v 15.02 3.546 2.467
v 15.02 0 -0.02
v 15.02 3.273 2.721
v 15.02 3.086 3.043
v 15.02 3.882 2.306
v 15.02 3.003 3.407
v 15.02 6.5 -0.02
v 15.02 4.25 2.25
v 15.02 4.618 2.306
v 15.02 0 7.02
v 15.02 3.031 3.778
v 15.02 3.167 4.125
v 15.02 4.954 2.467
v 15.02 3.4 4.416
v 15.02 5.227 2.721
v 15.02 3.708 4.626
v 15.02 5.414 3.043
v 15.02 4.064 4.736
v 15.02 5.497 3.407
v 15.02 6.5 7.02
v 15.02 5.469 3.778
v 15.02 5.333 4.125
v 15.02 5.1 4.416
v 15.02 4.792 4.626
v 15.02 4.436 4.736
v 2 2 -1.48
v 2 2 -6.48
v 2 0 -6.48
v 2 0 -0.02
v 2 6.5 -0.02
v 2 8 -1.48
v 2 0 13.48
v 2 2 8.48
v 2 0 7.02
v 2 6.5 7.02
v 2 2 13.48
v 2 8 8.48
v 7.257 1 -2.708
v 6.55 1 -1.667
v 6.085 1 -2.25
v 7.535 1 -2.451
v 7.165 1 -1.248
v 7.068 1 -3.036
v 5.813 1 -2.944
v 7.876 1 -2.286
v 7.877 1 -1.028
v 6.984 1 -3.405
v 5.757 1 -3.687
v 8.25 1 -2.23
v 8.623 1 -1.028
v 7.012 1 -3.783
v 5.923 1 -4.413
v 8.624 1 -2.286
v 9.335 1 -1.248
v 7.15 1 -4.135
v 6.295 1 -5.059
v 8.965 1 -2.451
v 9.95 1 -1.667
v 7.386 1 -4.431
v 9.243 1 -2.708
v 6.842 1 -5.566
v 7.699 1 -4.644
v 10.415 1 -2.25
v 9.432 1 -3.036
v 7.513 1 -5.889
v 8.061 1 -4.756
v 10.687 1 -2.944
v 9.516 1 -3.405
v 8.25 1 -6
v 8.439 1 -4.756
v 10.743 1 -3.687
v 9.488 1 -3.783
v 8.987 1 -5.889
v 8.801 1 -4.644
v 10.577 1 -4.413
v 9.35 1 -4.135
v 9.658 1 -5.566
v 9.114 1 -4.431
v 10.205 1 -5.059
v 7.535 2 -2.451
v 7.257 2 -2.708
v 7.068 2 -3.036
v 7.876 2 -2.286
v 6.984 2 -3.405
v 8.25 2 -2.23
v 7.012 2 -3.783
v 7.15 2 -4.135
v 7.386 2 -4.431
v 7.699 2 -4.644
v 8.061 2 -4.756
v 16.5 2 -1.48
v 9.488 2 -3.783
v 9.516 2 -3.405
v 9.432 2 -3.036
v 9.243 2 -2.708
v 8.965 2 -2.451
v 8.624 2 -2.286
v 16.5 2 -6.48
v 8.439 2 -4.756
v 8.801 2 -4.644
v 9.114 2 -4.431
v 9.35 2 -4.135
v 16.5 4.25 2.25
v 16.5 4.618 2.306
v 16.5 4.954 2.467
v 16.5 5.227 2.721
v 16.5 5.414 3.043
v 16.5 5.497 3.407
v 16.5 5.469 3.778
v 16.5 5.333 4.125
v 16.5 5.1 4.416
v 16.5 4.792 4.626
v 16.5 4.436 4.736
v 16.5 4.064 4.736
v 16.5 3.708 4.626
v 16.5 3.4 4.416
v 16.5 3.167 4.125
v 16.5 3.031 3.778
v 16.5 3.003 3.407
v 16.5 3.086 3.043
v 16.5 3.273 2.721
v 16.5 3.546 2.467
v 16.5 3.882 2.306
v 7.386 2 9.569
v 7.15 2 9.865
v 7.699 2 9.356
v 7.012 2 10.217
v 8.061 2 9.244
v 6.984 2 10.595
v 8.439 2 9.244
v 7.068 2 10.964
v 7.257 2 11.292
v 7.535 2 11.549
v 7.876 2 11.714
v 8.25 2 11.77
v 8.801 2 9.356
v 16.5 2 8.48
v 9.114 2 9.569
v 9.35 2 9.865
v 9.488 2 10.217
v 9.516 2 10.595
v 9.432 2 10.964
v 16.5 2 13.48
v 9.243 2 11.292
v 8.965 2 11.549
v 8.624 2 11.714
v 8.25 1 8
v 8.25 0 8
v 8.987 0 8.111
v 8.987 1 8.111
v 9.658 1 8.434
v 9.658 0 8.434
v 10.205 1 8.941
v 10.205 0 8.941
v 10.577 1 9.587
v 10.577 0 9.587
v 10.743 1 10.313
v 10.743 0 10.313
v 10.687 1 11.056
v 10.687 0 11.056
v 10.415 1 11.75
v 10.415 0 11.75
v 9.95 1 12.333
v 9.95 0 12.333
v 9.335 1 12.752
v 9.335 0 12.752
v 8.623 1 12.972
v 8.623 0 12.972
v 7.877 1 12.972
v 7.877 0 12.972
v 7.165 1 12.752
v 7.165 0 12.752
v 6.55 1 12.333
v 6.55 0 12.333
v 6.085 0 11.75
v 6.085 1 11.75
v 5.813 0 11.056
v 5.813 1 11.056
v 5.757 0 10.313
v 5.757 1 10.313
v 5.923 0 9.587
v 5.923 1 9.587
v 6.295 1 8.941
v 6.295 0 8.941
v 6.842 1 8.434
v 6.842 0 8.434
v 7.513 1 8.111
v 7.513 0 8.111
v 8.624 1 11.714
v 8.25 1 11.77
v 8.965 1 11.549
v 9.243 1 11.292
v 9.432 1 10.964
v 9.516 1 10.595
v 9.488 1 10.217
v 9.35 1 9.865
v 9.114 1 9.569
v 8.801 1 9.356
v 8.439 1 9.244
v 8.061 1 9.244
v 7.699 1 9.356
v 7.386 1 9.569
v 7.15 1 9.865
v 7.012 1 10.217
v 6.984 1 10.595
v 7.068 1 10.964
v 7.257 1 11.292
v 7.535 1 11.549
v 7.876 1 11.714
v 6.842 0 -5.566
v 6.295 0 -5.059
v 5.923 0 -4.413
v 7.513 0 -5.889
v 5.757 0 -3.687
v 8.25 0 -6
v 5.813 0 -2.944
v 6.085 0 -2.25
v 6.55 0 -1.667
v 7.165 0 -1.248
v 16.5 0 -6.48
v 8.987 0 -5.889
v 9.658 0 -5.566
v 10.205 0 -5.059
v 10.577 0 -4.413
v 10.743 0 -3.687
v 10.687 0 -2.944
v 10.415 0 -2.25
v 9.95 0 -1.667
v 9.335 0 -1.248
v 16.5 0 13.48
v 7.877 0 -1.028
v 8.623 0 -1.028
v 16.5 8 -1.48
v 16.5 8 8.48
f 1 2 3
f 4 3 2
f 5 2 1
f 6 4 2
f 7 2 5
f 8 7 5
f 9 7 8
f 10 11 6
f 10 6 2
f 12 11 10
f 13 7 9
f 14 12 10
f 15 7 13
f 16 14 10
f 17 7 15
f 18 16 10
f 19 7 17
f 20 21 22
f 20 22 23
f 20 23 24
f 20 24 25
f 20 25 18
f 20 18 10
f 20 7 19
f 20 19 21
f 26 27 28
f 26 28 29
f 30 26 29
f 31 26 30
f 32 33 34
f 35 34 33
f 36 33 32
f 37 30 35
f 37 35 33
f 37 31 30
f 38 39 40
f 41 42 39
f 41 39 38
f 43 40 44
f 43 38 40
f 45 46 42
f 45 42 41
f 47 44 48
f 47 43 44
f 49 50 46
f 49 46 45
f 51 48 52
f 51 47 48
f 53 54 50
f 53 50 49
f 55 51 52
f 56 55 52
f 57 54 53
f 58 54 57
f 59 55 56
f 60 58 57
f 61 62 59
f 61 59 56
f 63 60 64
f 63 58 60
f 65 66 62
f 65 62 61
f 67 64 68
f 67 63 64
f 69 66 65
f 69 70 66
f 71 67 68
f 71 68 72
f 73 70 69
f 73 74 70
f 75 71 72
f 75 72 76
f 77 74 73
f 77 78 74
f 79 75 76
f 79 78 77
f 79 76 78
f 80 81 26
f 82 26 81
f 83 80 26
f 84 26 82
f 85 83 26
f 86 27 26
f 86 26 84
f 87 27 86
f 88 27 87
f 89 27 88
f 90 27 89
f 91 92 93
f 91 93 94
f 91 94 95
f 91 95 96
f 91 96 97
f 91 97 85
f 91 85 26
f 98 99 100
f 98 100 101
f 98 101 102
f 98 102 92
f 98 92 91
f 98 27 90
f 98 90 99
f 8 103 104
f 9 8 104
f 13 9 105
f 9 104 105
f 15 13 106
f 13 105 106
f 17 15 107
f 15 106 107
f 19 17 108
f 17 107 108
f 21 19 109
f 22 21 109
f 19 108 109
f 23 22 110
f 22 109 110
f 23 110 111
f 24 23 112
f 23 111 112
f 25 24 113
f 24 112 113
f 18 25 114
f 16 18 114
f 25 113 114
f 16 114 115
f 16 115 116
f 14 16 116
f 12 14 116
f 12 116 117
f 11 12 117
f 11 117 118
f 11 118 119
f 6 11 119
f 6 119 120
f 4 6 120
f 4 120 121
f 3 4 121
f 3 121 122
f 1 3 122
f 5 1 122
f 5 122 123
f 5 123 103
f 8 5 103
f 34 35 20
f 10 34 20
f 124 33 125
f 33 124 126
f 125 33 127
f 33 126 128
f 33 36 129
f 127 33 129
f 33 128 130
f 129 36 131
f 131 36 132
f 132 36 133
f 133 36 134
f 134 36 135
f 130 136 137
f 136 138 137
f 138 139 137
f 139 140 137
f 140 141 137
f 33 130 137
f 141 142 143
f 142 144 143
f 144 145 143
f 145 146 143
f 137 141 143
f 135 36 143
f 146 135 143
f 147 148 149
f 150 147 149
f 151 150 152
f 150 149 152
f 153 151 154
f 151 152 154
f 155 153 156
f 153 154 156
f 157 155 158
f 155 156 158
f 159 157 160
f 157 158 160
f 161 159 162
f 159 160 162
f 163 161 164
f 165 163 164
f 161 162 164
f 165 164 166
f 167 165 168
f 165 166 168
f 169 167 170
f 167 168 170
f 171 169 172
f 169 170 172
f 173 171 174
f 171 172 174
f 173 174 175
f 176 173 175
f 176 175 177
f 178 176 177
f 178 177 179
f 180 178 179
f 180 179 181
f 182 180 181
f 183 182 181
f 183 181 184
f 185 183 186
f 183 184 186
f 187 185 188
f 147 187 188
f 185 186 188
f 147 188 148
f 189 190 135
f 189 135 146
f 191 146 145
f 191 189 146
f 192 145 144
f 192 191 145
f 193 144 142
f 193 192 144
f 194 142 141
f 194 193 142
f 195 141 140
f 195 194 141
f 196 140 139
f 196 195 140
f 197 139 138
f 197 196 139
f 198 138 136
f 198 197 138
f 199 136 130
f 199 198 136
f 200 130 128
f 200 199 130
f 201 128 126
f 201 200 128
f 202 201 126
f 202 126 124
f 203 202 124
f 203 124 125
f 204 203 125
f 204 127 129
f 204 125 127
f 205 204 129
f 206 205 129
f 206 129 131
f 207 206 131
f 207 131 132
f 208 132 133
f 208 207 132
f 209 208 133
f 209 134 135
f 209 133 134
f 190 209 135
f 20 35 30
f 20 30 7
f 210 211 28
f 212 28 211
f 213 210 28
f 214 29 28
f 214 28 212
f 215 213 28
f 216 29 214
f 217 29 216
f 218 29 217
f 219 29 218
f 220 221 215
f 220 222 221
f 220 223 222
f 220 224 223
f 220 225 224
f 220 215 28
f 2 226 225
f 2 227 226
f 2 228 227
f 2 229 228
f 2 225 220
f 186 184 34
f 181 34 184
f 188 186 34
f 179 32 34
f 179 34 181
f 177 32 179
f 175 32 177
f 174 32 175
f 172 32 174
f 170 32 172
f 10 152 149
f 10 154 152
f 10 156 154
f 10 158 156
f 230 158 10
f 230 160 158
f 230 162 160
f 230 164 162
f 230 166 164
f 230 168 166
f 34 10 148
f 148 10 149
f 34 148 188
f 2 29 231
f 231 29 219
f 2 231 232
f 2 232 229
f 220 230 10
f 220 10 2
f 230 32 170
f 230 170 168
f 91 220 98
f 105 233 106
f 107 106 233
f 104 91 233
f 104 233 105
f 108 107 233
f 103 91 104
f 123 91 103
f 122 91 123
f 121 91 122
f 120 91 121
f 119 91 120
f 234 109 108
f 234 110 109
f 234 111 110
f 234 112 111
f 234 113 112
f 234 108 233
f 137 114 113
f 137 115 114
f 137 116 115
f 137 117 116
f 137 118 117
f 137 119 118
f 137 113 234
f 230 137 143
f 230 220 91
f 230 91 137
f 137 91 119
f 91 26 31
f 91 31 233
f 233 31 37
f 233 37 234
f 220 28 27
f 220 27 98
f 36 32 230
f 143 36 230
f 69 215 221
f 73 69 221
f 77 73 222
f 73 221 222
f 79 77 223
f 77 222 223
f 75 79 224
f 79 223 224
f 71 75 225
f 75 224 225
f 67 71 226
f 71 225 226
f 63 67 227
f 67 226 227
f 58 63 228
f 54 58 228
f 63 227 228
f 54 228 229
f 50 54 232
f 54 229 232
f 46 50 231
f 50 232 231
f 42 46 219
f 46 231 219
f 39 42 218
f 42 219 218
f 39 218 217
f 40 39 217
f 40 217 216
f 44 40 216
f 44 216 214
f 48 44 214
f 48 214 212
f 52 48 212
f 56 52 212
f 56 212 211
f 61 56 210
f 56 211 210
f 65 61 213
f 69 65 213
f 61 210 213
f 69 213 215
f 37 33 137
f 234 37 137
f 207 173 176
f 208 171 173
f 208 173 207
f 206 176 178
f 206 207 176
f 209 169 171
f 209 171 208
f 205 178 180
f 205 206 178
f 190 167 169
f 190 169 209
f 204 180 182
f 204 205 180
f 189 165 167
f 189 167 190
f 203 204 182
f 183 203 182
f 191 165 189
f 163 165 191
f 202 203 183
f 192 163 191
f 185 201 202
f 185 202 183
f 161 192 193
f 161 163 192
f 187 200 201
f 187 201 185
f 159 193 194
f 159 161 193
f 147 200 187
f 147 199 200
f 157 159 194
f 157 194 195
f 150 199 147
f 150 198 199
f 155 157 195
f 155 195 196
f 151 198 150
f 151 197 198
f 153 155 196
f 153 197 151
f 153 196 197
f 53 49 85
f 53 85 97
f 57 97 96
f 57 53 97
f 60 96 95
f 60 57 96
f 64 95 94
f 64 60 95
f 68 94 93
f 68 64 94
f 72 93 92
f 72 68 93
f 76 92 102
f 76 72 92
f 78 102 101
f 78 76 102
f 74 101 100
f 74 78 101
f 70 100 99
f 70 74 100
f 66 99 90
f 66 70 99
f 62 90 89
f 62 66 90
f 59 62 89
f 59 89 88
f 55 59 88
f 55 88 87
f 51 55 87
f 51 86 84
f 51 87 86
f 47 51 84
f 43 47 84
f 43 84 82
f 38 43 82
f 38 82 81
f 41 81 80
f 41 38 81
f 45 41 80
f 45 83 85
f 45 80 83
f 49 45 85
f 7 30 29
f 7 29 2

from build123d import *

# Parameters (mm, degrees)
EXTRUDE_1_DEPTH          = 6.5
EXTRUDE_2_DEPTH          = 1.5
SKETCH_3_R               = 1.25
CUT_EXTRUDE_1_DEPTH      = 21.211382931
SKETCH_4_W               = 16.5
SKETCH_4_H               = 5
EXTRUDE_3_DEPTH          = 2
SKETCH_5_R               = 1.25
CUT_EXTRUDE_2_DEPTH      = 10
SKETCH_6_R               = 2.5
CUT_EXTRUDE_3_DEPTH      = 1
CUT_EXTRUDE_4_DEPTH      = 23.14723459
CUT_EXTRUDE_4_DEPTH_BACK = 23.14723459
SKETCH_7_R               = 1.27
CUT_EXTRUDE_5_DEPTH      = 23.14723459
CUT_EXTRUDE_5_DEPTH_BACK = 23.14723459
SKETCH_8_W               = 16.5
SKETCH_8_H               = 0.229721737
SKETCH_8_H_2             = 0.3558102
CUT_EXTRUDE_6_DEPTH      = 23.758743375
CUT_EXTRUDE_6_DEPTH_BACK = 6
SKETCH_9_W               = 16.5
SKETCH_9_H               = 0.02
SKETCH_10_W              = 15.04
SKETCH_10_H              = 7.04
CUT_EXTRUDE_7_DEPTH      = 6.5
SKETCH_11_W              = 27.526079408
SKETCH_11_H              = 12.932606898
CUT_EXTRUDE_8_DEPTH      = 2


with BuildPart() as part:
    # 草图1 → 凸台-拉伸1 (new body)
    with BuildSketch(Plane(origin=(0, 0, 0), x_dir=(1, 0, 0), z_dir=(0, 1, 0))):
        Polygon((0, 1.5), (16.5, 1.5), (16.5, -8.5), (0, -8.5), (0, -7), (15, -7), (15, 0), (0, 0), align=None)
    extrude(amount=EXTRUDE_1_DEPTH)

    # 草图2 → 凸台-拉伸2 (add)
    with BuildSketch(Plane(origin=(0, 6.5, 0), x_dir=(1, 0, 0), z_dir=(0, 1, 0))):
        Polygon((0, 0), (0, -7), (0, -8.5), (16.5, -8.5), (16.5, 1.5), (0, 1.5), align=None)
    extrude(amount=EXTRUDE_2_DEPTH)

    # 草图3 → 切除-拉伸1 (cut, through all)
    with BuildSketch(Plane(origin=(16.5, 0, 0), x_dir=(0, 0, -1), z_dir=(1, 0, 0))):
        with Locations((-3.5, 4.25)):
            Circle(SKETCH_3_R)
    extrude(amount=-CUT_EXTRUDE_1_DEPTH, mode=Mode.SUBTRACT)

    # 草图4 → 凸台-拉伸3 (add)
    with BuildSketch(Plane.XZ):
        with Locations((8.25, 11)):
            Rectangle(SKETCH_4_W, SKETCH_4_H)
        with Locations((8.25, -4)):
            Rectangle(SKETCH_4_W, SKETCH_4_H)
    extrude(amount=-EXTRUDE_3_DEPTH)

    # 草图5 → 切除-拉伸2 (cut)
    with BuildSketch(Plane.XZ):
        with Locations(Location((8.25, 10.5, 0), (0, 0, 270))):
            Circle(SKETCH_5_R)
        with Locations(Location((8.25, -3.5, 0), (0, 0, 270))):
            Circle(SKETCH_5_R)
    extrude(amount=-CUT_EXTRUDE_2_DEPTH, mode=Mode.SUBTRACT)

    # 草图6 → 切除-拉伸3 (cut)
    with BuildSketch(Plane.XZ):
        with Locations(Location((8.25, 10.5, 0), (0, 0, 270))):
            Circle(SKETCH_6_R)
        with Locations(Location((8.25, -3.5, 0), (0, 0, 270))):
            Circle(SKETCH_6_R)
    extrude(amount=-CUT_EXTRUDE_3_DEPTH, mode=Mode.SUBTRACT)

    # 草图7 → 切除-拉伸4 (cut, two sides: drawn at the far end of the back side and taken through both)
    with BuildSketch(Plane(origin=(0, 2, 0), x_dir=(1, 0, 0), z_dir=(0, 1, 0)).offset(-CUT_EXTRUDE_4_DEPTH_BACK)):
        with Locations(Location((8.25, 3.5, 0), (0, 0, 270))):
            Circle(SKETCH_7_R)
        with Locations(Location((8.25, -10.5, 0), (0, 0, 270))):
            Circle(SKETCH_7_R)
    extrude(amount=CUT_EXTRUDE_4_DEPTH + CUT_EXTRUDE_4_DEPTH_BACK, mode=Mode.SUBTRACT)

    # 草图8 → 切除-拉伸5 (cut, two sides: drawn at the far end of the back side and taken through both)
    with BuildSketch(Plane(origin=(0, 2, 0), x_dir=(1, 0, 0), z_dir=(0, 1, 0)).offset(-CUT_EXTRUDE_5_DEPTH_BACK)):
        with Locations((8.25, 6.594860869)):
            Rectangle(SKETCH_8_W, SKETCH_8_H)
        with Locations((8.25, -13.6579051)):
            Rectangle(SKETCH_8_W, SKETCH_8_H_2)
    extrude(amount=CUT_EXTRUDE_5_DEPTH + CUT_EXTRUDE_5_DEPTH_BACK, mode=Mode.SUBTRACT)

    # 草图9 → 切除-拉伸6 (cut, two sides: drawn at the far end of the back side and taken through both)
    with BuildSketch(Plane(origin=(0, 8, 0), x_dir=(1, 0, 0), z_dir=(0, 1, 0)).offset(-CUT_EXTRUDE_6_DEPTH_BACK)):
        with Locations((8.25, -8.49)):
            Rectangle(SKETCH_9_W, SKETCH_9_H)
        with Locations((8.25, 1.49)):
            Rectangle(SKETCH_9_W, SKETCH_9_H)
    extrude(amount=CUT_EXTRUDE_6_DEPTH + CUT_EXTRUDE_6_DEPTH_BACK, mode=Mode.SUBTRACT)

    # 草图10 → 切除-拉伸7 (cut)
    with BuildSketch(Plane.XZ.offset(-6.5)):
        with Locations((7.5, 3.5)):
            Rectangle(SKETCH_10_W, SKETCH_10_H)
    extrude(amount=CUT_EXTRUDE_7_DEPTH, mode=Mode.SUBTRACT)

    # 草图11 → 切除-拉伸8 (cut)
    with BuildSketch(Plane.ZY):
        with Locations((5.08335855, 3.634609565)):
            Rectangle(SKETCH_11_W, SKETCH_11_H)
    extrude(amount=-CUT_EXTRUDE_8_DEPTH, mode=Mode.SUBTRACT)


solid = part.part
